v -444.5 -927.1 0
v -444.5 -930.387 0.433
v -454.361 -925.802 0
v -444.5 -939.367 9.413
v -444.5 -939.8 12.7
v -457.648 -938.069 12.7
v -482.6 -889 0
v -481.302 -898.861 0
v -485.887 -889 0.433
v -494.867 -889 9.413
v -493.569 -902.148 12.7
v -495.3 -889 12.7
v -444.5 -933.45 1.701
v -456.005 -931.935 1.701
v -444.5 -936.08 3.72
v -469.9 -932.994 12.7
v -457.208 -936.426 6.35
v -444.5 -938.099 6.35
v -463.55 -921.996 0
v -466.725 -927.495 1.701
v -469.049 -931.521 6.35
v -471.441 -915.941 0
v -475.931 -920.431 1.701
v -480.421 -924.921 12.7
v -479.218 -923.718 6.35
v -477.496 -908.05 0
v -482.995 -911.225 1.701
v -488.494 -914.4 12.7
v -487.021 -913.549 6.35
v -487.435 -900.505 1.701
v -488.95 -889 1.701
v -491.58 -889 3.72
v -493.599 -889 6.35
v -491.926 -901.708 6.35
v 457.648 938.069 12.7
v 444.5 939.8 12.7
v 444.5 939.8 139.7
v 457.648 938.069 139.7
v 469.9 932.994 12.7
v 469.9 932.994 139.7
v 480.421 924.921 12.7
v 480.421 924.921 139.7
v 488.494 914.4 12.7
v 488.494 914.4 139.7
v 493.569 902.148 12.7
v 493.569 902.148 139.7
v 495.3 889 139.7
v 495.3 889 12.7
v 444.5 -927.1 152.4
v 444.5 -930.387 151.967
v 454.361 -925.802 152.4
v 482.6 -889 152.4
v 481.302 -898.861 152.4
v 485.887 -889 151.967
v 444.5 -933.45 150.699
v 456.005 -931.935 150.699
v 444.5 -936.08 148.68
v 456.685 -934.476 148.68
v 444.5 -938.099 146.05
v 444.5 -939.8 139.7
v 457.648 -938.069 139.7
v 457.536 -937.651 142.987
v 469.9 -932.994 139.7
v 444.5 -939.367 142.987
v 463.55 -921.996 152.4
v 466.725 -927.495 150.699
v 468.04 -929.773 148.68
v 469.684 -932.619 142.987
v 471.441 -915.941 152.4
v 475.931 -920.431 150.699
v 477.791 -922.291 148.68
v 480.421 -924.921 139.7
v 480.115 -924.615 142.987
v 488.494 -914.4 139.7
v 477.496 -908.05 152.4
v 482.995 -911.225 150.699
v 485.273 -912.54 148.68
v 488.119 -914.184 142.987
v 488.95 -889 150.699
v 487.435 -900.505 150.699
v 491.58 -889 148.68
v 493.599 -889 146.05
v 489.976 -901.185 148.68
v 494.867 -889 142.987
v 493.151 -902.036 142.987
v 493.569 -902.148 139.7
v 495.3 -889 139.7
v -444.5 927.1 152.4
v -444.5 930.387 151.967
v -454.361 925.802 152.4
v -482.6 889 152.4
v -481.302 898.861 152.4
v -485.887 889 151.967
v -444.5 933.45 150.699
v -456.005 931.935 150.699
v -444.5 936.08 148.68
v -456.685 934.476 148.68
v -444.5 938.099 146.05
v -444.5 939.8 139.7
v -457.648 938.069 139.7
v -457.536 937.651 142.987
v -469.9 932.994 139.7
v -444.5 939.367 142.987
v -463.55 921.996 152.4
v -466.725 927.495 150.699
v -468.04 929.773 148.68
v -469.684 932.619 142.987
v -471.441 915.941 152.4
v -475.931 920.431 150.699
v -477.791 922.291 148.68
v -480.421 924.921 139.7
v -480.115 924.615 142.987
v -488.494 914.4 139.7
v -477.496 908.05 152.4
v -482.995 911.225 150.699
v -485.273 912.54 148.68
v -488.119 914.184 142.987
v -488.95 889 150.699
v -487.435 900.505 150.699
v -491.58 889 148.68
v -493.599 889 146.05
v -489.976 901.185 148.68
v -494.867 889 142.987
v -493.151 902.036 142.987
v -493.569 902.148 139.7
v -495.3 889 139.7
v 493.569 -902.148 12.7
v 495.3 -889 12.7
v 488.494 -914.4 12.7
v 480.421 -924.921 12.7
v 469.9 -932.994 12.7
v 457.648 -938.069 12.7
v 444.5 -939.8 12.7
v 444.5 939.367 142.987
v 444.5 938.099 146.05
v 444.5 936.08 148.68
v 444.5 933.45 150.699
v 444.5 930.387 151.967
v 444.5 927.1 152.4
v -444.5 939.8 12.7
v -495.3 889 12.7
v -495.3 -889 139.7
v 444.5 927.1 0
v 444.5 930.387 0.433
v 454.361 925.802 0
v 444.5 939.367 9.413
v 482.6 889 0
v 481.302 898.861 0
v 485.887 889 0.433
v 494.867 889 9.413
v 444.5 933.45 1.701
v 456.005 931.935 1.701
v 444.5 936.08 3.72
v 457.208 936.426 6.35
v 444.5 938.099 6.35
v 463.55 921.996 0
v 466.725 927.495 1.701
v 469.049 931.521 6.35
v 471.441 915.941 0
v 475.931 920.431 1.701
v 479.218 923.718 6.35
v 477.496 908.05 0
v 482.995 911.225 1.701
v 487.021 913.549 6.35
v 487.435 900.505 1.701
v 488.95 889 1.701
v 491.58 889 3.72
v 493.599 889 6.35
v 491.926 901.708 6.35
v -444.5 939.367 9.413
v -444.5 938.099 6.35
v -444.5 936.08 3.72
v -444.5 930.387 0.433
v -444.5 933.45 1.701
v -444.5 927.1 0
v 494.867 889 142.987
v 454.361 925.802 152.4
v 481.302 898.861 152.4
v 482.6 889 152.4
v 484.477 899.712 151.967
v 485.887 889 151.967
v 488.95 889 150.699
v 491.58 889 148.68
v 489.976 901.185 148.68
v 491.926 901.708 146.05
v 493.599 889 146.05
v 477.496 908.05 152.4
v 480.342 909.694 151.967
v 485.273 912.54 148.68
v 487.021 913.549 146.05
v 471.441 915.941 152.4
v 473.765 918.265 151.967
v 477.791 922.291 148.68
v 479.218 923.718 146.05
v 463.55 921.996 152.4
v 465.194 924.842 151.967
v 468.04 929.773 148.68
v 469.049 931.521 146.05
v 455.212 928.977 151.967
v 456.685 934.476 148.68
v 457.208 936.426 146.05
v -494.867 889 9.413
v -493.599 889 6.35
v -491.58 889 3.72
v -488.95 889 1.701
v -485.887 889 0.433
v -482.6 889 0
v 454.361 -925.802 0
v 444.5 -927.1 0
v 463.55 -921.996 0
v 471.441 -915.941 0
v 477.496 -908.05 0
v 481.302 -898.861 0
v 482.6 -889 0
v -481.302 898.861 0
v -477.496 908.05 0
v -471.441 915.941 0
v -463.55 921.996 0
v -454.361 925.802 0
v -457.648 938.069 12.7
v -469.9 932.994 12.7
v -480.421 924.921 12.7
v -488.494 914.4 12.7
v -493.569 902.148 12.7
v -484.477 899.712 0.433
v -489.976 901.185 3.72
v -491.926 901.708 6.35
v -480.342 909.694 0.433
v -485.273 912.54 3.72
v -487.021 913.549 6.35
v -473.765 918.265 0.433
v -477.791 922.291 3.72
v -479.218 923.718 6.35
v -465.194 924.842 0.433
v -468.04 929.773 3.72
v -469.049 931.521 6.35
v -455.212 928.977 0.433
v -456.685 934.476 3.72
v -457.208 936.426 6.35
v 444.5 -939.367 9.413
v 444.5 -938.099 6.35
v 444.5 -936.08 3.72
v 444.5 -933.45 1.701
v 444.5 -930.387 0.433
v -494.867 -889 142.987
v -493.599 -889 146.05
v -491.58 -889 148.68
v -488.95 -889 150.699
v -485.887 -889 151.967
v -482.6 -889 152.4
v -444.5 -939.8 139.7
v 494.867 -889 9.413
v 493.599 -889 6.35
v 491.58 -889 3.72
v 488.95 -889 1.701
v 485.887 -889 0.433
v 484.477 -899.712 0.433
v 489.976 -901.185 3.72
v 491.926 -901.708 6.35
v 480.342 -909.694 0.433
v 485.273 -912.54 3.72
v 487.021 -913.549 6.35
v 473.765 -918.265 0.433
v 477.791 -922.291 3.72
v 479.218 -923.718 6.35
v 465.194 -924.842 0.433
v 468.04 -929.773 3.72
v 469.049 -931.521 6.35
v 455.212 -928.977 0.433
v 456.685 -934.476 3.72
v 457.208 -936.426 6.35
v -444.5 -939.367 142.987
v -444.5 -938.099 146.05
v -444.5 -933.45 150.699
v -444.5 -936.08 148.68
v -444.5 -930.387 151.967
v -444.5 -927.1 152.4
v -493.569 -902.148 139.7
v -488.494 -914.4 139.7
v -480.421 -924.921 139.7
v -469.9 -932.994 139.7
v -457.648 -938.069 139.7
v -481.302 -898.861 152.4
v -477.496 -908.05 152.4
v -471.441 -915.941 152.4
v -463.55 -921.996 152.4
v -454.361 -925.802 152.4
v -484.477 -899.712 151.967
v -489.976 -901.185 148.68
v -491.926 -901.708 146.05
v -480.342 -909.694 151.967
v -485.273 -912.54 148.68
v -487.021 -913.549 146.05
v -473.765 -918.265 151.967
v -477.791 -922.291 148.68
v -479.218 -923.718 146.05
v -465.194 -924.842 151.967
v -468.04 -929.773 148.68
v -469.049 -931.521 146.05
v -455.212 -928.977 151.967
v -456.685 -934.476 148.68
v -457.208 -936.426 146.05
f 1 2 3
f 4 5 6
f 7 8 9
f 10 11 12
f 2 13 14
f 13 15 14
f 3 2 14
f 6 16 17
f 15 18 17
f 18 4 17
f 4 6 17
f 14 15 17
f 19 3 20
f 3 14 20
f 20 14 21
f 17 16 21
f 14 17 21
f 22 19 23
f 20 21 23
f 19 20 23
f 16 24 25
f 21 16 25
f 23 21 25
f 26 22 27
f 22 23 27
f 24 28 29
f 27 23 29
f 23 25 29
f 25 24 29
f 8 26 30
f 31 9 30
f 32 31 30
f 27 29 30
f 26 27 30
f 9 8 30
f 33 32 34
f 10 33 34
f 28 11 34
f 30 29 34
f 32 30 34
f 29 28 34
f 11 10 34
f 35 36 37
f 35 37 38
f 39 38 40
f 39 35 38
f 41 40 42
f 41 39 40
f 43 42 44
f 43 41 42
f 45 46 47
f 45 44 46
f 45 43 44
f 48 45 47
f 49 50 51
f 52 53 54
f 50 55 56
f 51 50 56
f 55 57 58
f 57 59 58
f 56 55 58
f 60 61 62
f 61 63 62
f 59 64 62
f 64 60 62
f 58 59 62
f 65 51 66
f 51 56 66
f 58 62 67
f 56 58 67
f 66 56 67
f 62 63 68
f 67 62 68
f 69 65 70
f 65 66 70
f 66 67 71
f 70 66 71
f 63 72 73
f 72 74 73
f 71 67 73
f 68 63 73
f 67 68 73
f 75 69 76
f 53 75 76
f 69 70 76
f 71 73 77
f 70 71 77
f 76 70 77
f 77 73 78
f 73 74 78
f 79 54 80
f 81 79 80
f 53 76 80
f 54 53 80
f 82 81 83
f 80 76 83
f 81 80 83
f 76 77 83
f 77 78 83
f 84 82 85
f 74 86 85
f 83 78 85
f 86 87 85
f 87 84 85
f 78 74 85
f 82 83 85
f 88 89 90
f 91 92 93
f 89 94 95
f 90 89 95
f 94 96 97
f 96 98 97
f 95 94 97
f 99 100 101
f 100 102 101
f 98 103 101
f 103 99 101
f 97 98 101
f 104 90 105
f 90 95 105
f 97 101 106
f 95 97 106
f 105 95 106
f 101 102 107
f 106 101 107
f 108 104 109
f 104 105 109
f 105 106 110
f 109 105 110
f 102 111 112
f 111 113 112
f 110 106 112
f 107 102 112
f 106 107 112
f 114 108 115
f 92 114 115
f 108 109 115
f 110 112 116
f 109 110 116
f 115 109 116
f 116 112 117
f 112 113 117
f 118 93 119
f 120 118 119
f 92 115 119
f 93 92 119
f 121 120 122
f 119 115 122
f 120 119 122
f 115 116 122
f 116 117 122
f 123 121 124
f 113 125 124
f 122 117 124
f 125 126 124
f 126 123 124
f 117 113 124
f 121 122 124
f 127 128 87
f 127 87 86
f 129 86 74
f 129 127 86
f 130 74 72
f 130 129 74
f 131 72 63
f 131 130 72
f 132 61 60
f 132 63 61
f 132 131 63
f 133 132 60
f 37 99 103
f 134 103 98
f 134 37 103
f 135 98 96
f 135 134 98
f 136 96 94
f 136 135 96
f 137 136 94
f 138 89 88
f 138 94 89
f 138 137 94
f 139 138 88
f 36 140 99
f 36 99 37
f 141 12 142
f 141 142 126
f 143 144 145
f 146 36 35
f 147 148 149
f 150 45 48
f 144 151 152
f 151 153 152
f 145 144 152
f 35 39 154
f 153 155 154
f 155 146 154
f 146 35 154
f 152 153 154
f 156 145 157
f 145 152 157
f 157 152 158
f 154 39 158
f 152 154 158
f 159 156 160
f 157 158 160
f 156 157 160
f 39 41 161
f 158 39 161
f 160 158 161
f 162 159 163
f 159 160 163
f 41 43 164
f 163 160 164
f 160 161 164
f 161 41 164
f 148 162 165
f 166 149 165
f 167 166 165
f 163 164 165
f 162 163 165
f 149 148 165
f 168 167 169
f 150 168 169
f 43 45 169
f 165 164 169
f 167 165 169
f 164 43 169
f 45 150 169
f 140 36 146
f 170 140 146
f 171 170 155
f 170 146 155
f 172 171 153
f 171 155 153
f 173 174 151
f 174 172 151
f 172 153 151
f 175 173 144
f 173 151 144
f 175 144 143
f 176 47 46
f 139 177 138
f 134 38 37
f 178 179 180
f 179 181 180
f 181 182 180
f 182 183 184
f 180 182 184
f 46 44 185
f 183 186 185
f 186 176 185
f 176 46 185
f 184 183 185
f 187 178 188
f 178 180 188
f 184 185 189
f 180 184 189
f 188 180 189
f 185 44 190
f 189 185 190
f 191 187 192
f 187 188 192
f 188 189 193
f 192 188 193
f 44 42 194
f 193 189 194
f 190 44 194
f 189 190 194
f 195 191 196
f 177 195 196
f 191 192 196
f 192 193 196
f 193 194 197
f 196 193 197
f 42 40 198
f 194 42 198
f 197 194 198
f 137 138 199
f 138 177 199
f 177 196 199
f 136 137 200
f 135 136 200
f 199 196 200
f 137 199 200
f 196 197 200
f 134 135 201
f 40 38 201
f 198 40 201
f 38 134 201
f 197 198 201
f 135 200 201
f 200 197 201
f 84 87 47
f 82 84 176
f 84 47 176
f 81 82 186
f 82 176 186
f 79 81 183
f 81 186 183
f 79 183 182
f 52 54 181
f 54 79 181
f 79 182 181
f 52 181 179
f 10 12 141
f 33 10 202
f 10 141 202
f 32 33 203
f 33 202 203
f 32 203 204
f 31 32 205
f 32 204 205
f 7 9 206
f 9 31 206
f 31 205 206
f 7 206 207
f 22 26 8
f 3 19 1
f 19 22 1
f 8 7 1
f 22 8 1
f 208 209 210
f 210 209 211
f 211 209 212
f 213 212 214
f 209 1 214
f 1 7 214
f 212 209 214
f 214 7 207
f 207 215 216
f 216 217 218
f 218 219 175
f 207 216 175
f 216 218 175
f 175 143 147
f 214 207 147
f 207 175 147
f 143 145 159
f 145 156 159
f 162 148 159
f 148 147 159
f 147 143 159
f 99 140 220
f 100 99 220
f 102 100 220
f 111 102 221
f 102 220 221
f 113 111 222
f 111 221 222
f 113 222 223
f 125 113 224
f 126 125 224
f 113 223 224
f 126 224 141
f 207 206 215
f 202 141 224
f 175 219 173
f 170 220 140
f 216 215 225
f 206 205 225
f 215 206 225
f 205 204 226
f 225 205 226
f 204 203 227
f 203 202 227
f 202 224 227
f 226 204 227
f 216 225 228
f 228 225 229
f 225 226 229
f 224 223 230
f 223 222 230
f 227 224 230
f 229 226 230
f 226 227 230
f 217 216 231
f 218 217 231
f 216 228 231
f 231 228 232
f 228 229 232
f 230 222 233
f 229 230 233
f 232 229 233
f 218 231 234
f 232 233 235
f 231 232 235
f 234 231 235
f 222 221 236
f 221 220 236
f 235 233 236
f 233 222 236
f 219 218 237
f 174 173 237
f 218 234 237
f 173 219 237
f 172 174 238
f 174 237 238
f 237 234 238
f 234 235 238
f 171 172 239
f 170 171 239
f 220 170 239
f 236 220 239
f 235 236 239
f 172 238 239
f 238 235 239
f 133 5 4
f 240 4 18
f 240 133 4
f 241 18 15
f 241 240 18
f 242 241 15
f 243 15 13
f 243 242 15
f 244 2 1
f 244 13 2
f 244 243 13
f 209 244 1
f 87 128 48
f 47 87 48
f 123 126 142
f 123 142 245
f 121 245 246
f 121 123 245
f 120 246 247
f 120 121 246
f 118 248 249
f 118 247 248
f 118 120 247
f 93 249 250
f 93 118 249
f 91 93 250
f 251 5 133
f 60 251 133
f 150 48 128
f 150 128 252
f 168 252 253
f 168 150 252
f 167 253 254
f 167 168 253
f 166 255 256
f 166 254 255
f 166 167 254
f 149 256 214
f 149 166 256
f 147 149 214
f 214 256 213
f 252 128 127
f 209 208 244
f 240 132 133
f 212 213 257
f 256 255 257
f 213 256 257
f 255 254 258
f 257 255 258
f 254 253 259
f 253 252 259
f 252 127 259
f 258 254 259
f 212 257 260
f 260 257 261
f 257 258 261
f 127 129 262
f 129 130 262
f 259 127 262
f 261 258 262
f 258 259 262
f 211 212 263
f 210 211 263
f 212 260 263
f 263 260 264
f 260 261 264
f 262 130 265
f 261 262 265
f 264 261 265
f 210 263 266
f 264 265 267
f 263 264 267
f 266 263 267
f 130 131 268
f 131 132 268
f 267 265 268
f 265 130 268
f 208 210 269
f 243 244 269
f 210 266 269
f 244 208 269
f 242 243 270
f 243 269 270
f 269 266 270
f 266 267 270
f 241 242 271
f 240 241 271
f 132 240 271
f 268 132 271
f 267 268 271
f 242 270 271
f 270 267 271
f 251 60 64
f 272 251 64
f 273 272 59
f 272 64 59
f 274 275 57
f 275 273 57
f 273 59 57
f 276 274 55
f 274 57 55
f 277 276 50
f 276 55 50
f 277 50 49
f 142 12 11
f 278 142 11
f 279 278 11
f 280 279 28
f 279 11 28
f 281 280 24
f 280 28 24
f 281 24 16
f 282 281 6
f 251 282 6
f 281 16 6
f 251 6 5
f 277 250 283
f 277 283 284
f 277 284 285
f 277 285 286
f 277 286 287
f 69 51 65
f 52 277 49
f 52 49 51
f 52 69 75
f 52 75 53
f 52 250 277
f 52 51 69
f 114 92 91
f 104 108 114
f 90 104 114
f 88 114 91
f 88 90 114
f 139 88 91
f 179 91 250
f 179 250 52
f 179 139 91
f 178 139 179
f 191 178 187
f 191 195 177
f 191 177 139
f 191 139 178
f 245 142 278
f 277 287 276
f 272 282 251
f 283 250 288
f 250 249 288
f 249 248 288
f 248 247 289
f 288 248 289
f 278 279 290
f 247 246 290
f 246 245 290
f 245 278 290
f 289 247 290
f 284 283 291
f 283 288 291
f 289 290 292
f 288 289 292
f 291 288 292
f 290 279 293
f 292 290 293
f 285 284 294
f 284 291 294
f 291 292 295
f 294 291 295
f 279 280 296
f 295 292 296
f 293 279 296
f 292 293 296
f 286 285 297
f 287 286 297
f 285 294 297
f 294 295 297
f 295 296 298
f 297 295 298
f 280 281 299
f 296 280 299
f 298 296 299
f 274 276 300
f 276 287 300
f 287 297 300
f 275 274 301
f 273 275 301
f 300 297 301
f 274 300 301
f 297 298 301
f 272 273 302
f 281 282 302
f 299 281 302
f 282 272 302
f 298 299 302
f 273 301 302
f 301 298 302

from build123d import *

# Parameters (mm, degrees)
F0_W         = 990.6
F0_H         = 1879.6
F1_DEPTH     = 152.4
F2_R         = 12.7
F3_T1_DEPTH  = 152.4
F3_T4_ANGLE  = 90
F3_T6_ANGLE  = 90
F3_T8_ANGLE  = 90
F3_T10_ANGLE = 90
F3_T12_ANGLE = 90
F3_T14_ANGLE = 90
F3_T16_ANGLE = 90
F3_T18_ANGLE = 90


# Not quite as in the source:
# - a fillet or chamfer that OpenCascade refuses, or shapes differently, is made with other operations: its cross-section is extruded or revolved along the edge and cut away or added


with BuildPart() as f1:
    # F0 (on Top) → F1 (new body)
    with BuildSketch(Plane.XY):
        Rectangle(F0_W, F0_H)
    extrude(amount=F1_DEPTH)

    # F2
    f2_edges = [f1.edges().sort_by_distance(p)[0] for p in [
        (-495.3, 0, 152.4),
        (0, -939.8, 152.4),
        (495.3, 0, 152.4),
        (0, 939.8, 152.4),
        (495.3, 0, 0),
        (0, -939.8, 0),
        (-495.3, 0, 0),
        (0, 939.8, 0),
    ]]
    fillet(f2_edges, radius=F2_R)

    # F3: fillet of radius 50.8 on 4 edges, made by hand

    # F3_s2 → F3_t1 (cut)
    with BuildSketch(Plane.XY):
        with BuildLine():
            ThreePointArc((-495.3, -889), (-480.4210244843, -924.9210244843), (-444.5, -939.8))
            Line((-444.5, -939.8), (-444.5, -940.816))
            Line((-444.5, -940.816), (-496.316, -940.816))
            Line((-496.316, -940.816), (-496.316, -889))
            Line((-496.316, -889), (-495.3, -889))
        make_face()
        with BuildLine():
            ThreePointArc((495.3, -889), (480.4210244843, -924.9210244843), (444.5, -939.8))
            Line((444.5, -939.8), (444.5, -940.816))
            Line((444.5, -940.816), (496.316, -940.816))
            Line((496.316, -940.816), (496.316, -889))
            Line((496.316, -889), (495.3, -889))
        make_face()
        with BuildLine():
            ThreePointArc((444.5, 939.8), (480.4210244843, 924.9210244843), (495.3, 889))
            Line((495.3, 889), (496.316, 889))
            Line((496.316, 889), (496.316, 940.816))
            Line((496.316, 940.816), (444.5, 940.816))
            Line((444.5, 940.816), (444.5, 939.8))
        make_face()
        with BuildLine():
            ThreePointArc((-444.5, 939.8), (-480.4210244843, 924.9210244843), (-495.3, 889))
            Line((-495.3, 889), (-496.316, 889))
            Line((-496.316, 889), (-496.316, 940.816))
            Line((-496.316, 940.816), (-444.5, 940.816))
            Line((-444.5, 940.816), (-444.5, 939.8))
        make_face()
    extrude(amount=F3_T1_DEPTH, mode=Mode.SUBTRACT)

    # F3_s3 → F3_t4 (revolve, cut)
    with BuildSketch(Plane.XZ.offset(-889)):
        with BuildLine():
            ThreePointArc((-482.6, 0), (-491.5802561211, 3.7197438789), (-495.3, 12.7))
            Line((-495.3, 12.7), (-495.3, 0))
            Line((-495.3, 0), (-482.6, 0))
        make_face()
    revolve(axis=Axis((-444.5, 889, 0), (0, 0, -1)), revolution_arc=F3_T4_ANGLE, mode=Mode.SUBTRACT)

    # F3_s5 → F3_t6 (revolve, cut)
    with BuildSketch(Plane.YZ.offset(-444.5)):
        with BuildLine():
            ThreePointArc((927.1, 152.4), (936.0802561211, 148.6802561211), (939.8, 139.7))
            Line((939.8, 139.7), (939.8, 152.4))
            Line((939.8, 152.4), (927.1, 152.4))
        make_face()
    revolve(axis=Axis((-444.5, 889, 152.4), (0, 0, 1)), revolution_arc=F3_T6_ANGLE, mode=Mode.SUBTRACT)

    # F3_s7 → F3_t8 (revolve, cut)
    with BuildSketch(Plane.YZ.offset(444.5)):
        with BuildLine():
            ThreePointArc((927.1, 0), (936.0802561211, 3.7197438789), (939.8, 12.7))
            Line((939.8, 12.7), (939.8, 0))
            Line((939.8, 0), (927.1, 0))
        make_face()
    revolve(axis=Axis((444.5, 889, 0), (0, 0, -1)), revolution_arc=F3_T8_ANGLE, mode=Mode.SUBTRACT)

    # F3_s9 → F3_t10 (revolve, cut)
    with BuildSketch(Plane.XZ.offset(-889)):
        with BuildLine():
            ThreePointArc((482.6, 152.4), (491.5802561211, 148.6802561211), (495.3, 139.7))
            Line((495.3, 139.7), (495.3, 152.4))
            Line((495.3, 152.4), (482.6, 152.4))
        make_face()
    revolve(axis=Axis((444.5, 889, 152.4), (0, 0, 1)), revolution_arc=F3_T10_ANGLE, mode=Mode.SUBTRACT)

    # F3_s11 → F3_t12 (revolve, cut)
    with BuildSketch(Plane.XZ.offset(889)):
        with BuildLine():
            ThreePointArc((482.6, 0), (491.5802561211, 3.7197438789), (495.3, 12.7))
            Line((495.3, 12.7), (495.3, 0))
            Line((495.3, 0), (482.6, 0))
        make_face()
    revolve(axis=Axis((444.5, -889, 0), (0, 0, -1)), revolution_arc=F3_T12_ANGLE, mode=Mode.SUBTRACT)

    # F3_s13 → F3_t14 (revolve, cut)
    with BuildSketch(Plane.YZ.offset(444.5)):
        with BuildLine():
            ThreePointArc((-927.1, 152.4), (-936.0802561211, 148.6802561211), (-939.8, 139.7))
            Line((-939.8, 139.7), (-939.8, 152.4))
            Line((-939.8, 152.4), (-927.1, 152.4))
        make_face()
    revolve(axis=Axis((444.5, -889, 152.4), (0, 0, 1)), revolution_arc=F3_T14_ANGLE, mode=Mode.SUBTRACT)

    # F3_s15 → F3_t16 (revolve, cut)
    with BuildSketch(Plane.YZ.offset(-444.5)):
        with BuildLine():
            ThreePointArc((-927.1, 0), (-936.0802561211, 3.7197438789), (-939.8, 12.7))
            Line((-939.8, 12.7), (-939.8, 0))
            Line((-939.8, 0), (-927.1, 0))
        make_face()
    revolve(axis=Axis((-444.5, -889, 0), (0, 0, -1)), revolution_arc=F3_T16_ANGLE, mode=Mode.SUBTRACT)

    # F3_s17 → F3_t18 (revolve, cut)
    with BuildSketch(Plane.XZ.offset(889)):
        with BuildLine():
            ThreePointArc((-482.6, 152.4), (-491.5802561211, 148.6802561211), (-495.3, 139.7))
            Line((-495.3, 139.7), (-495.3, 152.4))
            Line((-495.3, 152.4), (-482.6, 152.4))
        make_face()
    revolve(axis=Axis((-444.5, -889, 152.4), (0, 0, 1)), revolution_arc=F3_T18_ANGLE, mode=Mode.SUBTRACT)


solid = f1.part
